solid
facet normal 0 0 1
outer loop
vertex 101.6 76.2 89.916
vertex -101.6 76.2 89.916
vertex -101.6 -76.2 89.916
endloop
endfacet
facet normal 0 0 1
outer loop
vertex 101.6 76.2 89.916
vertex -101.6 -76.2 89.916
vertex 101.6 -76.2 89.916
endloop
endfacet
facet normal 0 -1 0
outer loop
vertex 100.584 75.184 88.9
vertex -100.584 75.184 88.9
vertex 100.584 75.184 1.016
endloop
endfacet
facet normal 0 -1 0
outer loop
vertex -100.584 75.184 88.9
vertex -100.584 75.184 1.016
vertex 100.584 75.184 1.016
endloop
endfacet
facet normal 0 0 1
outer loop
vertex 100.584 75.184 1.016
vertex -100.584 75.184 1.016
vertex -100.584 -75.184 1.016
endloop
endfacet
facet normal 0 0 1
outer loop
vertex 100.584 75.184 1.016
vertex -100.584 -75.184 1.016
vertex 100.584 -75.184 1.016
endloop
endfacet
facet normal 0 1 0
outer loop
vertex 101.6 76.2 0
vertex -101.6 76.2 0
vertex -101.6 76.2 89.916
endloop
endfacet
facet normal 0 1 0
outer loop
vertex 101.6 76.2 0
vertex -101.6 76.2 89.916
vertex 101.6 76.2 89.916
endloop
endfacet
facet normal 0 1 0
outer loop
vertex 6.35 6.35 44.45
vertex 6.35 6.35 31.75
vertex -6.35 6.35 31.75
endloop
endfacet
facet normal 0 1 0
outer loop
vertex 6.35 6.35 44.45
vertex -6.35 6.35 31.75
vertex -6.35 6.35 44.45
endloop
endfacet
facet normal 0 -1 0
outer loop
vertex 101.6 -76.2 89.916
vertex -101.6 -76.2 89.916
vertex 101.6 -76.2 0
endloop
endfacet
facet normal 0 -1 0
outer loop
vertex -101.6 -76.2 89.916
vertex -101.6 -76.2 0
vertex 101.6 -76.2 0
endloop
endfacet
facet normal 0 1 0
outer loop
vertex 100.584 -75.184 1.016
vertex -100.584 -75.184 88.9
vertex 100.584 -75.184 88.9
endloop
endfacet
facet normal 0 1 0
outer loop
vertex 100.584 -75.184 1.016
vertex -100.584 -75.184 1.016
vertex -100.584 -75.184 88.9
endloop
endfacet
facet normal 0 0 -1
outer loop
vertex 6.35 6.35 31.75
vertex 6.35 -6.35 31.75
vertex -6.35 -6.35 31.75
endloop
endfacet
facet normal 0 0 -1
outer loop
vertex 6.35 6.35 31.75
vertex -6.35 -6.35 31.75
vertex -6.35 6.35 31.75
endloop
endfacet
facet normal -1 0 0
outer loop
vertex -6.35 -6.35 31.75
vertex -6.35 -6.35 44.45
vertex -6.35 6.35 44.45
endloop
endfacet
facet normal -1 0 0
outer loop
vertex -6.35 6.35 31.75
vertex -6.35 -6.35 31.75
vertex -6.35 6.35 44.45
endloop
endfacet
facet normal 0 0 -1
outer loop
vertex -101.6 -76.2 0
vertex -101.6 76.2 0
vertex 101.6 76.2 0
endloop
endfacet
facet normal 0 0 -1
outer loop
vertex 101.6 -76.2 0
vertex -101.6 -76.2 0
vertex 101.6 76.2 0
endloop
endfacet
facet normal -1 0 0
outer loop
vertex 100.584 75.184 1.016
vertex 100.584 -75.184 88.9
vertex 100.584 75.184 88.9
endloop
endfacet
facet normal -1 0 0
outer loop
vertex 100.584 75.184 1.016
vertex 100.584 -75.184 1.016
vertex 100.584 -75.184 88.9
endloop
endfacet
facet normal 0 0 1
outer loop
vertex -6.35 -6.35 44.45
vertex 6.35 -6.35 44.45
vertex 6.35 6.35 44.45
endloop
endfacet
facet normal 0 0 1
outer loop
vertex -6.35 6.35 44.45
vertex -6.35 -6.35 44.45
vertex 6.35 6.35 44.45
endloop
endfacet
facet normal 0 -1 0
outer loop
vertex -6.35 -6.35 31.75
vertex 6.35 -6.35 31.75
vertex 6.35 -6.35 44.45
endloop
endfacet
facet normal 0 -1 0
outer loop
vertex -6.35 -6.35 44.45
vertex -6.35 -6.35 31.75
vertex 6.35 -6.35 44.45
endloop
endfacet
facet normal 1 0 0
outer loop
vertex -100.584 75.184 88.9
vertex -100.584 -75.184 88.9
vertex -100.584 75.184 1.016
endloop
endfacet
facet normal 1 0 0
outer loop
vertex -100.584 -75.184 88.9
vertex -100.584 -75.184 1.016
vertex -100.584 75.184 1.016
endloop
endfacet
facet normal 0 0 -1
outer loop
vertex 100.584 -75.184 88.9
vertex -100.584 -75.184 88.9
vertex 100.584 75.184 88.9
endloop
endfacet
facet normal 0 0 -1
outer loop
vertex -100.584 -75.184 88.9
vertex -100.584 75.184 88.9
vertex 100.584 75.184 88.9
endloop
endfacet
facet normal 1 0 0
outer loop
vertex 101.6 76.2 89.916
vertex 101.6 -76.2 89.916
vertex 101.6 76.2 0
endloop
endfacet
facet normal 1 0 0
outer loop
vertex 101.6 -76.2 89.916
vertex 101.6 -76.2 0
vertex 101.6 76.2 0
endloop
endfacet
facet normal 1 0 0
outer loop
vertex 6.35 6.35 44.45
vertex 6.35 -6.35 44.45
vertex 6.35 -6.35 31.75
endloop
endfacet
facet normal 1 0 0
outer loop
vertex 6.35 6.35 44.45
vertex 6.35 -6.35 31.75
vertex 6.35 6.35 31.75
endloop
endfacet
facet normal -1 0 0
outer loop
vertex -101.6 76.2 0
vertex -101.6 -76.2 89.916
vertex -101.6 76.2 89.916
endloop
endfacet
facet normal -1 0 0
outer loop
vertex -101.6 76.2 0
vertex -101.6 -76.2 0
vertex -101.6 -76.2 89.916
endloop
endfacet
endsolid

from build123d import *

# Parameters (mm, degrees)
F0_W     = 203.2
F0_H     = 152.4
F1_DEPTH = 88.9
F2_T     = -1.016
F3_W     = 203.2
F3_H     = 152.4
F4_DEPTH = 1.016
F6_W     = 12.7
F6_H     = 12.7
F7_DEPTH = 12.7


with BuildPart() as f1:
    # F0 (on Top) → F1 (new body)
    with BuildSketch(Plane.XY):
        Rectangle(F0_W, F0_H)
    extrude(amount=F1_DEPTH)

    # F2
    f2_openings = [f1.faces().sort_by_distance(p)[0] for p in [
        (0, 0, 88.9),
    ]]
    offset(amount=F2_T, openings=f2_openings)

    # F3 (on face) → F4 (join)
    with BuildSketch(Plane.XY.offset(88.9)):
        Rectangle(F3_W, F3_H)
    extrude(amount=F4_DEPTH)


with BuildPart() as f7:
    # F6 (on offset) → F7 (new body)
    with BuildSketch(Plane.YZ.offset(6.35)):
        with Locations((0, 38.1)):
            Rectangle(F6_W, F6_H)
    extrude(amount=-F7_DEPTH)


solid = Compound([f1.part, f7.part])
